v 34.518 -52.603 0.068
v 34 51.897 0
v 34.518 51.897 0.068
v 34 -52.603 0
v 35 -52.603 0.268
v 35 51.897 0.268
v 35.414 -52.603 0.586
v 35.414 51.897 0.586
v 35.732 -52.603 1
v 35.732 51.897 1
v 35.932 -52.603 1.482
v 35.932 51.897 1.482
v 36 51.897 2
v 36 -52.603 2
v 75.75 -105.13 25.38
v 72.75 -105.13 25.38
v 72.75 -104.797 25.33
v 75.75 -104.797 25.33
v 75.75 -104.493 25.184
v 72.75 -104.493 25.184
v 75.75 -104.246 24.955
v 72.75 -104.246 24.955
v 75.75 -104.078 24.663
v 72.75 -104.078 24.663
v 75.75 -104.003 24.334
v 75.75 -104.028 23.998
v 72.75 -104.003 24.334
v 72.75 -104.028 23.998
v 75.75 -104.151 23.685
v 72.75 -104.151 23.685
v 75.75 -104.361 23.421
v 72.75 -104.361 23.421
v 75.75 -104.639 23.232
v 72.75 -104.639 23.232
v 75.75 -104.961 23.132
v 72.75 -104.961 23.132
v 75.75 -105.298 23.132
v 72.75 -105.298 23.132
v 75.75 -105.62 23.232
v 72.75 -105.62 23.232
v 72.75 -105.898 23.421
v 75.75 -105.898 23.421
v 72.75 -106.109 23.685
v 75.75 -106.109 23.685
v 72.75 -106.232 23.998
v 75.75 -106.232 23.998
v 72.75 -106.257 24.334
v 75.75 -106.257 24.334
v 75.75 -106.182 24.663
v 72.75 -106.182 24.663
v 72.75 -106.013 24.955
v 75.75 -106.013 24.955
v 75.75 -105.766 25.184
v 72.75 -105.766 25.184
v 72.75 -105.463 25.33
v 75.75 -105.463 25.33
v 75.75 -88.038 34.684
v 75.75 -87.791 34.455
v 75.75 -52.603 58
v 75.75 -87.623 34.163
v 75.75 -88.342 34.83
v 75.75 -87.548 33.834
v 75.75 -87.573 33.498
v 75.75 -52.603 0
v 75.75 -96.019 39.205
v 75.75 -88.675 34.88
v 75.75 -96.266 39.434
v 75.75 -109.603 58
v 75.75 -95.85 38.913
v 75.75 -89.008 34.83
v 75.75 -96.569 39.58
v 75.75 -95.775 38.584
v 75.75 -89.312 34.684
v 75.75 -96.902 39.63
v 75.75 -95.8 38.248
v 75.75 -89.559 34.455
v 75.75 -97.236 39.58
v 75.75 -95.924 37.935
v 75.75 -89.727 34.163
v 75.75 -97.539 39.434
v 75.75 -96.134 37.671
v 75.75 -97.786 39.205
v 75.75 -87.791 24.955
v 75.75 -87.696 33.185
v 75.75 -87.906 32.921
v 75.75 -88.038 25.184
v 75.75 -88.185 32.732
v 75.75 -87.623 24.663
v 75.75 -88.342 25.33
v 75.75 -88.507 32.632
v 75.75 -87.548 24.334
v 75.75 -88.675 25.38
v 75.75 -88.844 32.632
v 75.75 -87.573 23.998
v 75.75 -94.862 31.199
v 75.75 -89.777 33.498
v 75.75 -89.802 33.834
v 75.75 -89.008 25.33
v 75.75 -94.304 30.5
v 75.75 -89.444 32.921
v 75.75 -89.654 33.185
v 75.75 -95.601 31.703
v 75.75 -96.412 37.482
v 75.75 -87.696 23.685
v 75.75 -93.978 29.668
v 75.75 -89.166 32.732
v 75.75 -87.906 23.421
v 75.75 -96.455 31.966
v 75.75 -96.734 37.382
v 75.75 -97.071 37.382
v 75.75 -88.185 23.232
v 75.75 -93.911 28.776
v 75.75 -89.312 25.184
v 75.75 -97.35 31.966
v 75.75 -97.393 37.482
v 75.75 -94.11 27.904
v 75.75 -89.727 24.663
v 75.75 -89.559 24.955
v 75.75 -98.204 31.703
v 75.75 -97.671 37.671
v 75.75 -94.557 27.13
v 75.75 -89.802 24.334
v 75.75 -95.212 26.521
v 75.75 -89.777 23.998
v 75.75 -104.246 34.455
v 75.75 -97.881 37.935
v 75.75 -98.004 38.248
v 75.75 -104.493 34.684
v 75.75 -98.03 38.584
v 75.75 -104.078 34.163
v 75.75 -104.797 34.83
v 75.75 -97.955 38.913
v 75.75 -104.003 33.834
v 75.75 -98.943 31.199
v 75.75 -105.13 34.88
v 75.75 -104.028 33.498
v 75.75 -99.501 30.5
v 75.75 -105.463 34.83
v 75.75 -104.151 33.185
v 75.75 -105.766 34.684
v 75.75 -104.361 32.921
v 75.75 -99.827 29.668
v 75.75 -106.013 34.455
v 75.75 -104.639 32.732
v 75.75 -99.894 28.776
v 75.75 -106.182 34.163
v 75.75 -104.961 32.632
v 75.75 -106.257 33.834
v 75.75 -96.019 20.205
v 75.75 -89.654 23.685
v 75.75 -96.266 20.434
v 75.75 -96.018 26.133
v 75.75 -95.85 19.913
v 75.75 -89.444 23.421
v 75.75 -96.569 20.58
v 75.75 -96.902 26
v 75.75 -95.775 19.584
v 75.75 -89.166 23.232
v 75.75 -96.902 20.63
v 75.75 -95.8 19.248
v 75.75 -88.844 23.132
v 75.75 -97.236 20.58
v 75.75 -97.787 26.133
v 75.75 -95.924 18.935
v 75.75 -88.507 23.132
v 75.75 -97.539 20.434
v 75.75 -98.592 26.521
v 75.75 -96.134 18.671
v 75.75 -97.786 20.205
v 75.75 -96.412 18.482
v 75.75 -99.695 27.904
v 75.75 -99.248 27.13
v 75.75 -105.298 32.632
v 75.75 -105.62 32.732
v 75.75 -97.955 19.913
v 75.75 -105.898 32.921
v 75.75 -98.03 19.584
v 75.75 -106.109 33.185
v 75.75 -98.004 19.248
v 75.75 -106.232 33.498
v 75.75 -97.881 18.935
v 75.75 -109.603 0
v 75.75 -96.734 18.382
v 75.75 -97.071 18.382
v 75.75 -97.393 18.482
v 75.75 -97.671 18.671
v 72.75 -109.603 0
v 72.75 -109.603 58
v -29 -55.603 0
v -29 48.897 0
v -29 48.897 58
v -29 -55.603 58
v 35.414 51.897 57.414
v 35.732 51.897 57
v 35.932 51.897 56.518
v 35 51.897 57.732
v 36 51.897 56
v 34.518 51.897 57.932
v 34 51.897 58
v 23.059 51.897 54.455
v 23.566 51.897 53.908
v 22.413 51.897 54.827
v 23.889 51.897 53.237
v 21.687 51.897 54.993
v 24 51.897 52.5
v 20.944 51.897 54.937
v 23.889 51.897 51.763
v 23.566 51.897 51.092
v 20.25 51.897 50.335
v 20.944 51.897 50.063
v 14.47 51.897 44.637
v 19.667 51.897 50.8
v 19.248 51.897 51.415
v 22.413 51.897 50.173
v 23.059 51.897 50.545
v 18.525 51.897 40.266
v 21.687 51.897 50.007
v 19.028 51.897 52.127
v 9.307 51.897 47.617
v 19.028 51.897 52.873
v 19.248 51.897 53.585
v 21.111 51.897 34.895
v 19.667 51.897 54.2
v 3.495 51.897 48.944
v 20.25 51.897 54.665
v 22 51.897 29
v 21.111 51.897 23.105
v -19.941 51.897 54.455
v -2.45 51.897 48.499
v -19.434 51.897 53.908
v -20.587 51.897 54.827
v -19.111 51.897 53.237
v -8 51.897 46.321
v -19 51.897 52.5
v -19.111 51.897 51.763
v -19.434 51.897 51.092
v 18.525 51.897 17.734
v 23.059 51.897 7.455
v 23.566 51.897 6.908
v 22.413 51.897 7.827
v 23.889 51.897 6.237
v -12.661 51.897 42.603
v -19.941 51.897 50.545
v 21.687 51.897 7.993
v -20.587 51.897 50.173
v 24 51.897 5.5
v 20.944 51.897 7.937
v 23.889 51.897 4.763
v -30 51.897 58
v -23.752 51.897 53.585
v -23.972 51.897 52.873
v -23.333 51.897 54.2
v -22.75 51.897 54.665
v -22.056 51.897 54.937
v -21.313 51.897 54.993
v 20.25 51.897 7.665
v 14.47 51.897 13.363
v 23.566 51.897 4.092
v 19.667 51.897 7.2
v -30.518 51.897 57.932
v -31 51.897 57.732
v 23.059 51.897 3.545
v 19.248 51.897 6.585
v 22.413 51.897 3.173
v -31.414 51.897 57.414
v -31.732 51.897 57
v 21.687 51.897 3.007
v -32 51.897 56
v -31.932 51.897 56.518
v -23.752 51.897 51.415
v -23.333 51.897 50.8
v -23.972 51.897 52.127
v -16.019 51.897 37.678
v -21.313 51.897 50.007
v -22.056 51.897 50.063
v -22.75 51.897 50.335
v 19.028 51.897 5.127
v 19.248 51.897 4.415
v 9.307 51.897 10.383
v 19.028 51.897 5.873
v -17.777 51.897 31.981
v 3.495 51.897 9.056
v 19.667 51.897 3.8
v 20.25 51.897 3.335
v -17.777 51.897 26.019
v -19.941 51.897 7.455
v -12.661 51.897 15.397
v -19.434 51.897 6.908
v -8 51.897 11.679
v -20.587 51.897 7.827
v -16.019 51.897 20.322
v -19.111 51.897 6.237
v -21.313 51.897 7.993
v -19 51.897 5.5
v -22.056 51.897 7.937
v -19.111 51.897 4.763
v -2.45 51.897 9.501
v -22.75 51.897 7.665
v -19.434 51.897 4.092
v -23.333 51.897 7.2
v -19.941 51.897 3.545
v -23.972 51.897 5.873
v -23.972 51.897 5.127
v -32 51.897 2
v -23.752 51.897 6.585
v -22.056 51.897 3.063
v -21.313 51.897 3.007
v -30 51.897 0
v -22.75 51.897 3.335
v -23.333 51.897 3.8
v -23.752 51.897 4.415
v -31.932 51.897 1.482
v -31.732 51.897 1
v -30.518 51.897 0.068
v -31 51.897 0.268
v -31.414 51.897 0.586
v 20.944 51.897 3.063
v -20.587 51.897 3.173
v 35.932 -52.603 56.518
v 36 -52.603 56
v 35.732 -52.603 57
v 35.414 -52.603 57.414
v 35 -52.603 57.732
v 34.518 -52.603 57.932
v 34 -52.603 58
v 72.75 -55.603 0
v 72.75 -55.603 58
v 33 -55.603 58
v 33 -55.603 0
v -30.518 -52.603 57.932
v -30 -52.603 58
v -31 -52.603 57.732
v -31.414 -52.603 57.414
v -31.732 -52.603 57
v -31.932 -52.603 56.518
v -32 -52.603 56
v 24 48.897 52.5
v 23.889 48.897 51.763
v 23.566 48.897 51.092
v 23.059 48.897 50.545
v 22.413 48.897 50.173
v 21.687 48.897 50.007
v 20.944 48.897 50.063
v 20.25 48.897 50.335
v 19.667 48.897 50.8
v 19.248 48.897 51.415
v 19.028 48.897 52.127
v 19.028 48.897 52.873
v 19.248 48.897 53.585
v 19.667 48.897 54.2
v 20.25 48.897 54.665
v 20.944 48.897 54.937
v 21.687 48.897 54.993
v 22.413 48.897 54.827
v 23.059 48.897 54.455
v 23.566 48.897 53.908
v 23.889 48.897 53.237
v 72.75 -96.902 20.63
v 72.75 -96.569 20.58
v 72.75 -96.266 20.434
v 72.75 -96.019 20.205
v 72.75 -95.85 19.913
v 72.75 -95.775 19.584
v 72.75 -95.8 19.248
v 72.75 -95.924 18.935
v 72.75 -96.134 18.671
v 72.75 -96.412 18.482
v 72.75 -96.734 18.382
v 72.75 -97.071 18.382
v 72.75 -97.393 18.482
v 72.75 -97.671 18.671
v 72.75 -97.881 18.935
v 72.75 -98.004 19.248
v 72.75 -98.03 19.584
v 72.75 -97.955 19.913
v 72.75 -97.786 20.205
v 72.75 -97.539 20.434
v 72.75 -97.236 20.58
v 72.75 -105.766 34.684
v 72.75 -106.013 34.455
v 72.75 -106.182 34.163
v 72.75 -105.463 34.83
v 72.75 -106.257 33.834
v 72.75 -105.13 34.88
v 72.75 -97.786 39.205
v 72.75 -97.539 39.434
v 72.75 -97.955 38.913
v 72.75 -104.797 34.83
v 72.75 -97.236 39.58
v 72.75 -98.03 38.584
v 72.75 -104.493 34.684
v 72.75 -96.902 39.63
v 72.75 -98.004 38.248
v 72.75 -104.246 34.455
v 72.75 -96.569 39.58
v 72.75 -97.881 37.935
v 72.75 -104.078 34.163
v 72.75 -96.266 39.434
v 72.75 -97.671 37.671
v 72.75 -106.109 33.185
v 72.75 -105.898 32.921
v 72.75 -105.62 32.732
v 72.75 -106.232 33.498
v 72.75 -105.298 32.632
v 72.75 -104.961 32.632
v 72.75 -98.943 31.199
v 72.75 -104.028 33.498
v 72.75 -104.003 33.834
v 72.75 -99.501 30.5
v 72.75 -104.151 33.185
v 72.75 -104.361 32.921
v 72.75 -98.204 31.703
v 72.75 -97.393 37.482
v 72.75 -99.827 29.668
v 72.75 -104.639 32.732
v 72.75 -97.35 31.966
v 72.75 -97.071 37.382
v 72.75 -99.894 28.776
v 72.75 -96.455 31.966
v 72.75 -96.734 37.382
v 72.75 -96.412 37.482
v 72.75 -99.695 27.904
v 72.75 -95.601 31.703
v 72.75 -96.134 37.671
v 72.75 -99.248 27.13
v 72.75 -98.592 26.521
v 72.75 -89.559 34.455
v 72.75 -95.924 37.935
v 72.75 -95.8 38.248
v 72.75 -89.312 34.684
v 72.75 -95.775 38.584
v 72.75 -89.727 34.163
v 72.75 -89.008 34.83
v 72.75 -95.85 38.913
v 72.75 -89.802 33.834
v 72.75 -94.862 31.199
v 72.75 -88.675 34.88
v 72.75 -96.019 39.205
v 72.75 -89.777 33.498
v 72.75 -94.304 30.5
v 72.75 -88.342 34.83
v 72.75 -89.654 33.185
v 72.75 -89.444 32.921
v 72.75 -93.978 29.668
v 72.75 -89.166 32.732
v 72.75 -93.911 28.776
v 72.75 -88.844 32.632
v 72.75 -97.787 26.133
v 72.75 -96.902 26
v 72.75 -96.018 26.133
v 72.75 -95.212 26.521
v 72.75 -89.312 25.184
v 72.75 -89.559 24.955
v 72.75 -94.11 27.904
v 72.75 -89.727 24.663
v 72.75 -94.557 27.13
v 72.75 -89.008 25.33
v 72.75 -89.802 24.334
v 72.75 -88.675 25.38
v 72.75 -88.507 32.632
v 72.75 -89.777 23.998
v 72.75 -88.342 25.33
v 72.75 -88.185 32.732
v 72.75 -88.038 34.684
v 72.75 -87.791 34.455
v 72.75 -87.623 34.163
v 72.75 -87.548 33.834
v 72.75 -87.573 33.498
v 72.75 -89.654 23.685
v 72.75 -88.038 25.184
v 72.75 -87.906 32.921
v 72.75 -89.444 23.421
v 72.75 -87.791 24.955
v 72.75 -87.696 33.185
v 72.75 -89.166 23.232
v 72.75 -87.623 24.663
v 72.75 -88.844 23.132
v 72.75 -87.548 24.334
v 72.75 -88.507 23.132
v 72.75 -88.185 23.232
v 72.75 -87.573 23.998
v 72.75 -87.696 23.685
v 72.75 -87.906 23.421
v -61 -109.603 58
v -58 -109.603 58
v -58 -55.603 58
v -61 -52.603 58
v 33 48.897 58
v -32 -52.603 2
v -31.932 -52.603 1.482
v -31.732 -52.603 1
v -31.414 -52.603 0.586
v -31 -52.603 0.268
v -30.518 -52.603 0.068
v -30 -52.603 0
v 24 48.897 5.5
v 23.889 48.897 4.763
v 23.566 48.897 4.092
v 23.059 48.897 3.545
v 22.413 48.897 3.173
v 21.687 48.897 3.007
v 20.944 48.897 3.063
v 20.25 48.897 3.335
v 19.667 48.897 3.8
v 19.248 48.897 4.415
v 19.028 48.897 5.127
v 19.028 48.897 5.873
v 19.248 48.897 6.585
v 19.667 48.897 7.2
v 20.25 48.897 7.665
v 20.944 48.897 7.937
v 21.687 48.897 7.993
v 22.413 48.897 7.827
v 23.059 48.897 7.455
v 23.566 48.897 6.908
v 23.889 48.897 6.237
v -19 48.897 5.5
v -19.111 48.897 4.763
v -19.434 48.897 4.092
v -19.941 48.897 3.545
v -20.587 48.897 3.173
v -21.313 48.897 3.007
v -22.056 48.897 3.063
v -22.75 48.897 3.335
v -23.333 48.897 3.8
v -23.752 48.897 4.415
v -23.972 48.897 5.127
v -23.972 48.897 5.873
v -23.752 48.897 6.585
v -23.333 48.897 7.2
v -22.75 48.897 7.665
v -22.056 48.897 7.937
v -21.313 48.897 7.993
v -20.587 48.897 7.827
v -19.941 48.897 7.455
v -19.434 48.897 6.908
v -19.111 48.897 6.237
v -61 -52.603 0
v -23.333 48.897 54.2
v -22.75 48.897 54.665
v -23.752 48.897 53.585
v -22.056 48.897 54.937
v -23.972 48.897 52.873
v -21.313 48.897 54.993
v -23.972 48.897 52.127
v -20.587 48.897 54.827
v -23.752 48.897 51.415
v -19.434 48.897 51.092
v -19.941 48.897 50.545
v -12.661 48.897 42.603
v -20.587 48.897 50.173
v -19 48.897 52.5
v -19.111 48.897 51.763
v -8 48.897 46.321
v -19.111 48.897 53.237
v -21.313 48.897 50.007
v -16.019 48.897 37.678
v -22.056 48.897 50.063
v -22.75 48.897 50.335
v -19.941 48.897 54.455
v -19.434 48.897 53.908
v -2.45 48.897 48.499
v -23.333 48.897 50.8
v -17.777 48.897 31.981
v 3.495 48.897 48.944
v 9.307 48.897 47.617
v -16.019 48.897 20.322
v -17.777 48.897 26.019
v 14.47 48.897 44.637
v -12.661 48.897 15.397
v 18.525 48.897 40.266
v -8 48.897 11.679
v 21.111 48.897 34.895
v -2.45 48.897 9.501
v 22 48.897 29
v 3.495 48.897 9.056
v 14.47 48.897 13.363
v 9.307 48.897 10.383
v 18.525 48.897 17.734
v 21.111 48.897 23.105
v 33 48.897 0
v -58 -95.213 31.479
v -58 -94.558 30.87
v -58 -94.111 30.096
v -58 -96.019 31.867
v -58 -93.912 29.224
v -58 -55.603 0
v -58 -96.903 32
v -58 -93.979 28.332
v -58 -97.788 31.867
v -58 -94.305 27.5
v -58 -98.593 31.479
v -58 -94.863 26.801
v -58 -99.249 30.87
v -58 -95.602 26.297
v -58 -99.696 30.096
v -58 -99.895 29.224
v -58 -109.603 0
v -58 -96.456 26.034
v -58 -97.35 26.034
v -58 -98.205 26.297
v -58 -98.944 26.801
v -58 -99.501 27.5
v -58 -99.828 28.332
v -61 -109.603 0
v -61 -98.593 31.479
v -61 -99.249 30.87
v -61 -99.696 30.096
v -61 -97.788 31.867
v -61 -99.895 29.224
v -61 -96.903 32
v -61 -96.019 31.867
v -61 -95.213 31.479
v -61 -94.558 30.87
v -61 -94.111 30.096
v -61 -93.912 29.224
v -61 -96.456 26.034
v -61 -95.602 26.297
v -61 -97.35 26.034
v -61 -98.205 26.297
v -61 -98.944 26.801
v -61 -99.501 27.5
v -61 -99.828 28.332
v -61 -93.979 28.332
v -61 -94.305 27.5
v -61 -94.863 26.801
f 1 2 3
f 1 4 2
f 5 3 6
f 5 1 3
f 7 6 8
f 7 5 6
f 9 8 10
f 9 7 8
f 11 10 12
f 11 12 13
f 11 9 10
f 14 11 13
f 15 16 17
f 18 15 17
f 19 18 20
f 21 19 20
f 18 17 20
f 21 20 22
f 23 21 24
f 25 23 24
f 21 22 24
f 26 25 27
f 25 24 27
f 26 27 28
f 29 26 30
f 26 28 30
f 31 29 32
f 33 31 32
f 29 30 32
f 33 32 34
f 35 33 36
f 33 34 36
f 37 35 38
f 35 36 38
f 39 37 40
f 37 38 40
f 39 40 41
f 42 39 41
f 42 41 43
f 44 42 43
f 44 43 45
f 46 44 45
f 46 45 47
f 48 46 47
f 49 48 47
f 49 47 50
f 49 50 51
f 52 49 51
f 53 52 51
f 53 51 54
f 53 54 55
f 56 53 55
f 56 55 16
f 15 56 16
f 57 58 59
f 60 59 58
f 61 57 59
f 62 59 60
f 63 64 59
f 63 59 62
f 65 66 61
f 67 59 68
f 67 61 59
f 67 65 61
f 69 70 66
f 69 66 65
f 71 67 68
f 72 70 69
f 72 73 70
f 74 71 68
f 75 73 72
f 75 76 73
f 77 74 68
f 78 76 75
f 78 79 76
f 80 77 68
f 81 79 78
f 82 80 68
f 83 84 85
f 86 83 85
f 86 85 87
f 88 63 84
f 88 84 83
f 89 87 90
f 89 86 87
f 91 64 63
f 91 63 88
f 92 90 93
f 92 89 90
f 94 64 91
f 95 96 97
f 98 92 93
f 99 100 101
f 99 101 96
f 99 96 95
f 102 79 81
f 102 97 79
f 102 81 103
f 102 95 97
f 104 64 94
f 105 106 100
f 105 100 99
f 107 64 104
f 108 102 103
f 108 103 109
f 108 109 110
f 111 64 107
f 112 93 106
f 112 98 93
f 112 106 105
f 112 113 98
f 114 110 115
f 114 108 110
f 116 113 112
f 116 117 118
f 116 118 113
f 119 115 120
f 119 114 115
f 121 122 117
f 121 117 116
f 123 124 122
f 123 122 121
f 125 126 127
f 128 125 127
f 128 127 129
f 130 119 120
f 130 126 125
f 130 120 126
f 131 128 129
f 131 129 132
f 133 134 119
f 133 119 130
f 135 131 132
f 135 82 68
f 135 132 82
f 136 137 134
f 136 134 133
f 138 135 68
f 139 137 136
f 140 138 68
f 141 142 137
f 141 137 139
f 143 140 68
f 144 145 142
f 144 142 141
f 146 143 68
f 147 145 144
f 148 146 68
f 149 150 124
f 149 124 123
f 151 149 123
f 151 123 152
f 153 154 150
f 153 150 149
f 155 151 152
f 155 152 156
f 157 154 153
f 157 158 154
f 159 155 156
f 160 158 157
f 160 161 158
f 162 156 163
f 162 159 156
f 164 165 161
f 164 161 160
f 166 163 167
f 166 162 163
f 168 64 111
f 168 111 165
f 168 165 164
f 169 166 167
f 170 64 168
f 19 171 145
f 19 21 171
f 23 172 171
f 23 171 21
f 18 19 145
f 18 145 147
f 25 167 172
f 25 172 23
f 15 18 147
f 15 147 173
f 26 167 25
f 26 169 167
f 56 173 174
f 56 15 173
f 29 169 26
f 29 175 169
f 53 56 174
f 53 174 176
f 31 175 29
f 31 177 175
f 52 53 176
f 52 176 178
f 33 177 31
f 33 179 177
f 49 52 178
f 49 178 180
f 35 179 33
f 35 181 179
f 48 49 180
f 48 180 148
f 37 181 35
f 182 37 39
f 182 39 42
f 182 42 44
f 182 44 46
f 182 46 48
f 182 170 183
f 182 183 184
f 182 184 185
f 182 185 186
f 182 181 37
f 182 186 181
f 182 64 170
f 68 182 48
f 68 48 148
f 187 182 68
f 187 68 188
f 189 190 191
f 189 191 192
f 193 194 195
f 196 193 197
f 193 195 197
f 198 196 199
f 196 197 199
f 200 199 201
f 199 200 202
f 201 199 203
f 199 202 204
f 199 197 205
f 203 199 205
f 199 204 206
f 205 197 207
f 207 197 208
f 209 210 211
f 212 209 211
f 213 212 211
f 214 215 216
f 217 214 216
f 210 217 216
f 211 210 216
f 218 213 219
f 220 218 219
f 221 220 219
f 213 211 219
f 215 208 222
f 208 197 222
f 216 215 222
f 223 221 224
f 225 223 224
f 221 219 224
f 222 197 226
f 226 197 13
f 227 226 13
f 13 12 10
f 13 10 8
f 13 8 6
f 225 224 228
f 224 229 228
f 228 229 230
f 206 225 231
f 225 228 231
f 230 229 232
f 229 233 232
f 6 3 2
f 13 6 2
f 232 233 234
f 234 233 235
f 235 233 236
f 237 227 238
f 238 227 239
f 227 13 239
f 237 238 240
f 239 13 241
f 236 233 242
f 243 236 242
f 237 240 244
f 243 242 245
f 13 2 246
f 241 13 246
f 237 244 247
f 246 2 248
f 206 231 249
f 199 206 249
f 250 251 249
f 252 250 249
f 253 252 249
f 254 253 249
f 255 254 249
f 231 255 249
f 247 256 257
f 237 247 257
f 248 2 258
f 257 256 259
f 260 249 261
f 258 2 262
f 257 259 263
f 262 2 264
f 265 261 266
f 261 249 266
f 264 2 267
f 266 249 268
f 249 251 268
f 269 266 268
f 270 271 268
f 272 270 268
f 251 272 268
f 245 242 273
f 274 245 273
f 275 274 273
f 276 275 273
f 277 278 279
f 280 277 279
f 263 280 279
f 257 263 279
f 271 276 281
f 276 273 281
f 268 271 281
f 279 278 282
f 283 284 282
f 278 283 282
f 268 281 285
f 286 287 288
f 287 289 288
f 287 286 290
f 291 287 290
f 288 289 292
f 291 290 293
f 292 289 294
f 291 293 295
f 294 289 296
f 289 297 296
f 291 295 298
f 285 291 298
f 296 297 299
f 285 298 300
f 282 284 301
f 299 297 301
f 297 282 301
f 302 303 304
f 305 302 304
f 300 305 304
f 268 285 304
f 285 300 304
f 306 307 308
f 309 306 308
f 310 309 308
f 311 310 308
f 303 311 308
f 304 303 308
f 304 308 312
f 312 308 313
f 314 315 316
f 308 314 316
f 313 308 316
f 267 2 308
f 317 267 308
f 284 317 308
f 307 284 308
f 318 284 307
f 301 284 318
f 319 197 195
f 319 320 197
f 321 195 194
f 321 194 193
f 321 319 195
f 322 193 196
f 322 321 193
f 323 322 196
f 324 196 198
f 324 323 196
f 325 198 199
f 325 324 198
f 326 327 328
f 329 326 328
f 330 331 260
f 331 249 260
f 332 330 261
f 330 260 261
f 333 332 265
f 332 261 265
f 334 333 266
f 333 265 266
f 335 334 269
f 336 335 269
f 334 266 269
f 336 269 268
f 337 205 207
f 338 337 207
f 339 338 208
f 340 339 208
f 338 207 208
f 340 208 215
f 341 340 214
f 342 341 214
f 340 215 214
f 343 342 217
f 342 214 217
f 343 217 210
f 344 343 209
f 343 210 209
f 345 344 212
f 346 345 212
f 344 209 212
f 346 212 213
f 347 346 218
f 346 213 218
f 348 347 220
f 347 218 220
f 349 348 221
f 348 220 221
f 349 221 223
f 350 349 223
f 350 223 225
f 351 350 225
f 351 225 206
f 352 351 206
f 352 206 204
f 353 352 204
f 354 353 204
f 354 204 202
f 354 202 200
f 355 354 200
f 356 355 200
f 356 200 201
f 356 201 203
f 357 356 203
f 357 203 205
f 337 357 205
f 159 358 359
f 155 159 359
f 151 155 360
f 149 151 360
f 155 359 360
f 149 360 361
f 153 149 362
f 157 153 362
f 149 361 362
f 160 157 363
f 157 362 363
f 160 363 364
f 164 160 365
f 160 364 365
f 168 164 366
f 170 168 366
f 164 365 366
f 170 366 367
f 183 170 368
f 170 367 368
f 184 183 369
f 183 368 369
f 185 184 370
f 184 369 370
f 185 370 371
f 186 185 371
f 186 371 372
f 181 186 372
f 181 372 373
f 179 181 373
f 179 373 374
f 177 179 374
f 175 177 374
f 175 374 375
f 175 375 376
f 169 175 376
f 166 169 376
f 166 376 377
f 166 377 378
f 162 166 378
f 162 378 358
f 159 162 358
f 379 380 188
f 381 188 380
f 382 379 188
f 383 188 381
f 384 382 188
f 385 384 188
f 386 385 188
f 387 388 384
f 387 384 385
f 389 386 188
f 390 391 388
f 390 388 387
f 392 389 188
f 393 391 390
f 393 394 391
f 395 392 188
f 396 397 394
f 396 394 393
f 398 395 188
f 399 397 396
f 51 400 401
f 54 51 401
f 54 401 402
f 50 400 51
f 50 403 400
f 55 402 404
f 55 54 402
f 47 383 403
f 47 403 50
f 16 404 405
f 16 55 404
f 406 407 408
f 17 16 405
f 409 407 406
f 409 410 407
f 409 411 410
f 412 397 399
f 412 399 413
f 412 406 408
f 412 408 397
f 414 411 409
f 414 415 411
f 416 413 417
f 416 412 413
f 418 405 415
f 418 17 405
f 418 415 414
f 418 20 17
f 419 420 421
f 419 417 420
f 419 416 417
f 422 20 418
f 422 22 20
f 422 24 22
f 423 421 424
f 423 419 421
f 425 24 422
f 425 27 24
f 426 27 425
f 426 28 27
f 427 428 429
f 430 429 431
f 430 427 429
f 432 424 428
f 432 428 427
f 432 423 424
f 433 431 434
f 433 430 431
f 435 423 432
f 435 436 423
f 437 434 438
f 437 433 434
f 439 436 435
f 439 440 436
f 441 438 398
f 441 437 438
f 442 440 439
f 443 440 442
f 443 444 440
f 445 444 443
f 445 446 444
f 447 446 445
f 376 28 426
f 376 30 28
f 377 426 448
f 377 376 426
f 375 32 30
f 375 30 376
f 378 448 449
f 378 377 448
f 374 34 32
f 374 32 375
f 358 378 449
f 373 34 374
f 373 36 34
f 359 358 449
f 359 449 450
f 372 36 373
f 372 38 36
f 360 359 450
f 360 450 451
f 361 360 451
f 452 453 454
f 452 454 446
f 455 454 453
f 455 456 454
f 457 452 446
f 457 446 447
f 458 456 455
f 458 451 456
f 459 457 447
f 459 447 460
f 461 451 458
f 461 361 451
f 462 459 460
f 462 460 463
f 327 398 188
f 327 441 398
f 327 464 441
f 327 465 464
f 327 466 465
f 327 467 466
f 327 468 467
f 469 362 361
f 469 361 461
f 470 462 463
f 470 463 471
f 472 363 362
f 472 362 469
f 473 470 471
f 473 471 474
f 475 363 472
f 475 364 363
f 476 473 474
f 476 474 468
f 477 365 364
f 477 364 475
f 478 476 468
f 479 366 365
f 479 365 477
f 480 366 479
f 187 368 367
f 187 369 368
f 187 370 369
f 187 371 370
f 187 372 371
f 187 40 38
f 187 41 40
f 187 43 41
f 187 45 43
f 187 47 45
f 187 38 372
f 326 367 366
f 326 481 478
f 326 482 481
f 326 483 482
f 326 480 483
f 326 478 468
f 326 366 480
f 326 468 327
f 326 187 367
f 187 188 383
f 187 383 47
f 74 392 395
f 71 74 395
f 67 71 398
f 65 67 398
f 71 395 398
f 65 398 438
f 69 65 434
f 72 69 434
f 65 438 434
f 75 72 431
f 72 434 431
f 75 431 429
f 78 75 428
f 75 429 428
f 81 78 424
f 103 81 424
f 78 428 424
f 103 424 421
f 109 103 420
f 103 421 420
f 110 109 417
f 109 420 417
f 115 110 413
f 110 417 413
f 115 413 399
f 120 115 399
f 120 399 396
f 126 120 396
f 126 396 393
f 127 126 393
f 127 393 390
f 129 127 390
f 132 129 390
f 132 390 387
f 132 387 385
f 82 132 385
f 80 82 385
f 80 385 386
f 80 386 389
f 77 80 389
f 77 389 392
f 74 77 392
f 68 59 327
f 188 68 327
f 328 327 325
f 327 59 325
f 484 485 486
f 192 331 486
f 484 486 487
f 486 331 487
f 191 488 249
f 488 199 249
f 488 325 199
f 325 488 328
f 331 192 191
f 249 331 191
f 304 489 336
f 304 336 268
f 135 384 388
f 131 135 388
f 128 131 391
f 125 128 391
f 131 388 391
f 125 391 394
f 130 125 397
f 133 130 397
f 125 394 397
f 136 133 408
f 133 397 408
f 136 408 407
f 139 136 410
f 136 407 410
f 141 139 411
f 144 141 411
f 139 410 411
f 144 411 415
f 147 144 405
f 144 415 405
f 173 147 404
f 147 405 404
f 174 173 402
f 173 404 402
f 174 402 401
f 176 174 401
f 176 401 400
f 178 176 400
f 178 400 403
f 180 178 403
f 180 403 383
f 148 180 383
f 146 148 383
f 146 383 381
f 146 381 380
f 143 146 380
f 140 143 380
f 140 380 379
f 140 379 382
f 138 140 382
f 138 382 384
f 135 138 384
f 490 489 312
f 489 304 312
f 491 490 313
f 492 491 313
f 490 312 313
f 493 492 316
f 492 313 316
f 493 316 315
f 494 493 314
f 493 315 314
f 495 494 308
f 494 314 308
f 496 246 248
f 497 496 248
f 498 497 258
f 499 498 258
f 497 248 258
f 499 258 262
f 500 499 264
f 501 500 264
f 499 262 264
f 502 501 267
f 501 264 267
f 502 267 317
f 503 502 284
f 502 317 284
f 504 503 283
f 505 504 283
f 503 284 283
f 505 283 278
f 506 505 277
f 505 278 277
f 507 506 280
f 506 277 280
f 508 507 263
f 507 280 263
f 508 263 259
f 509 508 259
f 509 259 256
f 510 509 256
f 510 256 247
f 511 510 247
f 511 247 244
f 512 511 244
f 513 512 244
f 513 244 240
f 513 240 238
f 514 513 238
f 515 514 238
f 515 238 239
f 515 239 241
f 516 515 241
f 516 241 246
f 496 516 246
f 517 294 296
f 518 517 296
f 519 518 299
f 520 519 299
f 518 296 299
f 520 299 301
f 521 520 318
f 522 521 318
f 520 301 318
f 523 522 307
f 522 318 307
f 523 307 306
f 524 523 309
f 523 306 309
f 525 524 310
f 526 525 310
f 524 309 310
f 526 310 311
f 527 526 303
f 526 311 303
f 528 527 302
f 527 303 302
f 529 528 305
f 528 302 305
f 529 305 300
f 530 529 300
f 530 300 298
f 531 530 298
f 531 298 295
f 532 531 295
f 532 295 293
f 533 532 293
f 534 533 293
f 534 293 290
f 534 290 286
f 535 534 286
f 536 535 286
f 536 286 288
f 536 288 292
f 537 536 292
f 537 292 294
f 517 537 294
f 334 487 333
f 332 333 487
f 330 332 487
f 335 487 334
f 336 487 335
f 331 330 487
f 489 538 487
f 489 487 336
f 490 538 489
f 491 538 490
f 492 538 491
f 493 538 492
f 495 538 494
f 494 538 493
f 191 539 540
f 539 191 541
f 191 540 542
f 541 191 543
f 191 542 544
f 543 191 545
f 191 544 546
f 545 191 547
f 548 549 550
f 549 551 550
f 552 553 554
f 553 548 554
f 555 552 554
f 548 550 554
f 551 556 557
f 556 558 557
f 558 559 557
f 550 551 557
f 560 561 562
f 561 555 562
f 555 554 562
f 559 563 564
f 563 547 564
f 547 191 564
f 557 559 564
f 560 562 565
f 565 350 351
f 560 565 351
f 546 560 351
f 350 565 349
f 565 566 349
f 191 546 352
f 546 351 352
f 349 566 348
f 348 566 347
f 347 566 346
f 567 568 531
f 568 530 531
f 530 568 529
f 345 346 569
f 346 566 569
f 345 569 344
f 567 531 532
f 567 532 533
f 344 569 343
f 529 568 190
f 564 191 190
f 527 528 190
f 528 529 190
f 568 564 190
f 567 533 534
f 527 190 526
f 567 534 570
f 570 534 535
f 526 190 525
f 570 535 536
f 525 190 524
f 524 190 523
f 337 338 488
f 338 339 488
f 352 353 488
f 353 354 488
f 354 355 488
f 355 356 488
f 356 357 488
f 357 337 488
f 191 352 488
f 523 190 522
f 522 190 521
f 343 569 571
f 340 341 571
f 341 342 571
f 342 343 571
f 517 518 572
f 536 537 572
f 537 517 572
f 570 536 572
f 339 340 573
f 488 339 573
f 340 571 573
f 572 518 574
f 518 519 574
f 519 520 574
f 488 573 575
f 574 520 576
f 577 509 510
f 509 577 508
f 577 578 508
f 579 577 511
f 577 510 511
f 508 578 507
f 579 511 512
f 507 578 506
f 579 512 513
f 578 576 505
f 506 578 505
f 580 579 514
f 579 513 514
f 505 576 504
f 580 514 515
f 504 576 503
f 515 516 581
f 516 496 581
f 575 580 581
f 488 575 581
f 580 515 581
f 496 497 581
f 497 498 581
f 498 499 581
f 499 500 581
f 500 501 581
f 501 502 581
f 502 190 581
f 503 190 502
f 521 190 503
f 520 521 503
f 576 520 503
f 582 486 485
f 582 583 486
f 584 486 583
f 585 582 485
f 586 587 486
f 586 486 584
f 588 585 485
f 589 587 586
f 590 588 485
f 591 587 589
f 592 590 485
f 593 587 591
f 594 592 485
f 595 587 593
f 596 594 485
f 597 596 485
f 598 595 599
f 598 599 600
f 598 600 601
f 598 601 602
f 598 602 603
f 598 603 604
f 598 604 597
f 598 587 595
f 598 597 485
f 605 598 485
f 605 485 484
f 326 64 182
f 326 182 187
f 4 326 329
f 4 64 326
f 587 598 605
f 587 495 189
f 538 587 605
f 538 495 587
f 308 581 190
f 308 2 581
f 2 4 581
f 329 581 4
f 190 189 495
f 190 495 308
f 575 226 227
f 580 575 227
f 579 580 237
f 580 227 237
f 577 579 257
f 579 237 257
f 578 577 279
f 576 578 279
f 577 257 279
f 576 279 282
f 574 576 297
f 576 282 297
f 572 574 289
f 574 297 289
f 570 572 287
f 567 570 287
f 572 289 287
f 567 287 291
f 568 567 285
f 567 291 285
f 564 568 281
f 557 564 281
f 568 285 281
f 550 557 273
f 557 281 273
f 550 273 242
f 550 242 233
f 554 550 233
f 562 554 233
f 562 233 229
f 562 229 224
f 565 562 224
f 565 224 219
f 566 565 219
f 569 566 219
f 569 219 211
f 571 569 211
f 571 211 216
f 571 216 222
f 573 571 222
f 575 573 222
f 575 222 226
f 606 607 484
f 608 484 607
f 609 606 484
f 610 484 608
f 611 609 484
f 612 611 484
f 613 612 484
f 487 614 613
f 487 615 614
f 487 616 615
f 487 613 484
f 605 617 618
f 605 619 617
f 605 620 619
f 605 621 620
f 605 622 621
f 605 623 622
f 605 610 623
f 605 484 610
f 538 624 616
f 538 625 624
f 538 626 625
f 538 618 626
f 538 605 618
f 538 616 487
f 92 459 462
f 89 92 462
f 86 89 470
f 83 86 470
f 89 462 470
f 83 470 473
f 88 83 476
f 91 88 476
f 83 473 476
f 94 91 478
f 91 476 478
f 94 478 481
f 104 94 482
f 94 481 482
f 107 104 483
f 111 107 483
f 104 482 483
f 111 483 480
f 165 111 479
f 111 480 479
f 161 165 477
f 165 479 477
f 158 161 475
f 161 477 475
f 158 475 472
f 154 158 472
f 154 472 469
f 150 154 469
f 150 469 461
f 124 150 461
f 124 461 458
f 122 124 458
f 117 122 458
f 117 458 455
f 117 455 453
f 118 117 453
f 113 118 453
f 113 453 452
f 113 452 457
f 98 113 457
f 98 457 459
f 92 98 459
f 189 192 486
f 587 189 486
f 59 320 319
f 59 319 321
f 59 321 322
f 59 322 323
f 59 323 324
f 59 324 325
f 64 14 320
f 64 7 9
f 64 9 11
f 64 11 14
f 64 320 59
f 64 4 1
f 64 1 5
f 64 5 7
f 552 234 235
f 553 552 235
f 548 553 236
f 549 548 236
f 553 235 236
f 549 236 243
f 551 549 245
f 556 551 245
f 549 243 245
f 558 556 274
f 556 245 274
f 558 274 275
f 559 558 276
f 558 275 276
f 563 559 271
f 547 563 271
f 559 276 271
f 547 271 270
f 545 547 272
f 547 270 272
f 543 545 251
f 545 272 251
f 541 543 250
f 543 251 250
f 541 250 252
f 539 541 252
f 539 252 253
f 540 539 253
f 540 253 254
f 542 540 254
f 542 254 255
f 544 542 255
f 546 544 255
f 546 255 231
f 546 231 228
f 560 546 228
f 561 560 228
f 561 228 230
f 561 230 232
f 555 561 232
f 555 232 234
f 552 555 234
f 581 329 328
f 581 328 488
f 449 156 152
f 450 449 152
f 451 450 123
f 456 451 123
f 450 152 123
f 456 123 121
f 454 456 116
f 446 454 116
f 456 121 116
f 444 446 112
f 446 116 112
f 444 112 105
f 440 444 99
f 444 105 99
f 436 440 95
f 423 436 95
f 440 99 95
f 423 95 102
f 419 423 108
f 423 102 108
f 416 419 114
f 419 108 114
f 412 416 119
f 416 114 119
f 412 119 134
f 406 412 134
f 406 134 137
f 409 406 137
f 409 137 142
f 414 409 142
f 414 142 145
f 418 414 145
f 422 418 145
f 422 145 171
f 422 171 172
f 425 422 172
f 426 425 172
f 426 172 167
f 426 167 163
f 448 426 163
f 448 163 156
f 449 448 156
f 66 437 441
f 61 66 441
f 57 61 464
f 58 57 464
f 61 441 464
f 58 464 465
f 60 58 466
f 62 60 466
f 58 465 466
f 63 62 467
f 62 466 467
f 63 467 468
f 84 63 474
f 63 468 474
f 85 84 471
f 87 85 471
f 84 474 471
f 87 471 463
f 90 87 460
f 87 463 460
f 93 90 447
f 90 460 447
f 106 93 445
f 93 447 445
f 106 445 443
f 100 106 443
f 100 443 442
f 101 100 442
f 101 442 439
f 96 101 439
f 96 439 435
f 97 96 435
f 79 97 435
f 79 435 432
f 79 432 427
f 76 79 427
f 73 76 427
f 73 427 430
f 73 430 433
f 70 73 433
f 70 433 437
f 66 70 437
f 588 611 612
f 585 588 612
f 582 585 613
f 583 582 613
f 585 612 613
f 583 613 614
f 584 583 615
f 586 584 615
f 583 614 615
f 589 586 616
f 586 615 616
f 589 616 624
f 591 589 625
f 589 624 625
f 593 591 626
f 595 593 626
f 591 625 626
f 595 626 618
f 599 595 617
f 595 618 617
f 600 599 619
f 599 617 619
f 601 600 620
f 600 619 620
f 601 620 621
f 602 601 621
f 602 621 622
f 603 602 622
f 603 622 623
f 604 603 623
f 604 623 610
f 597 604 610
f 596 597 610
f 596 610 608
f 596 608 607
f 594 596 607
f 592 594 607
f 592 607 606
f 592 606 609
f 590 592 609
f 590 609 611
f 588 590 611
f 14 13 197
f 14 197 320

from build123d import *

# Parameters (mm, degrees)
BOSS_EXTRUDE1_DEPTH       = 58
SKETCH3_R                 = 2.5
SKETCH3_R_2               = 20
CUT_EXTRUDE1_DEPTH        = 58
SKETCH5_R                 = 3
CUT_EXTRUDE3_DEPTH        = 58
F_4_40_TAPPED_HOLE2_D     = 2.2606
F_4_40_TAPPED_HOLE2_DEPTH = 7.6
F_4_40_TAPPED_HOLE2_TIP   = 0.679152758
SKETCH15_R                = 3
CUT_EXTRUDE4_DEPTH        = 10
FILLET1_R                 = 2
FILLET2_R                 = 2
FILLET3_R                 = 2
FILLET4_R                 = 2


with BuildPart() as part:
    # Sketch2 → Boss-Extrude1 (new body)
    with BuildSketch(Plane.XY):
        Polygon((2, 51.896715462), (36, 51.896715462), (36, -52.603284538), (75.75, -52.603284538), (75.75, -109.603284538), (72.75, -109.603284538), (72.75, -55.603284538), (33, -55.603284538), (33, 48.896715462), (2, 48.896715462), (-29, 48.896715462), (-29, -55.603284538), (-58, -55.603284538), (-58, -109.603284538), (-61, -109.603284538), (-61, -52.603284538), (-32, -52.603284538), (-32, 51.896715462), align=None)
    extrude(amount=BOSS_EXTRUDE1_DEPTH)

    # Sketch3 → Cut-Extrude1 (cut)
    with BuildSketch(Plane(origin=(0, 51.896715462, 0), x_dir=(1, 0, 0), z_dir=(0, 1, 0))):
        with Locations((-21.5, -5.5)):
            Circle(SKETCH3_R)
        with Locations((21.5, -5.5)):
            Circle(SKETCH3_R)
        with Locations((21.5, -52.5)):
            Circle(SKETCH3_R)
        with Locations((-21.5, -52.5)):
            Circle(SKETCH3_R)
        with Locations((2, -29)):
            Circle(SKETCH3_R_2)
    extrude(amount=-CUT_EXTRUDE1_DEPTH, mode=Mode.SUBTRACT)

    # Sketch5 → Cut-Extrude3 (cut)
    with BuildSketch(Plane.ZY.offset(61)):
        with Locations((29, -96.903284538)):
            Circle(SKETCH5_R)
    extrude(amount=-CUT_EXTRUDE3_DEPTH, mode=Mode.SUBTRACT)

    # #4-40 Tapped Hole2
    with Locations(Plane(origin=(75.75, 0, 0), x_dir=(0, 0, -1), z_dir=(1, 0, 0))):
        with Locations((-19.5, -96.902439923), (-24.25, -105.129681259), (-33.75, -105.129681259), (-38.5, -96.902439923), (-33.75, -88.675198587), (-24.25, -88.675198587)):
            Hole(F_4_40_TAPPED_HOLE2_D / 2, depth=F_4_40_TAPPED_HOLE2_DEPTH)
            with Locations((0, 0, -(F_4_40_TAPPED_HOLE2_DEPTH + F_4_40_TAPPED_HOLE2_TIP / 2))):  # 118° drill point
                Cone(0, F_4_40_TAPPED_HOLE2_D / 2, F_4_40_TAPPED_HOLE2_TIP, mode=Mode.SUBTRACT)

    # Sketch15 → Cut-Extrude4 (cut)
    with BuildSketch(Plane(origin=(75.75, 0, 0), x_dir=(0, 0, -1), z_dir=(1, 0, 0))):
        with Locations((-29, -96.902439923)):
            Circle(SKETCH15_R)
    extrude(amount=-CUT_EXTRUDE4_DEPTH, mode=Mode.SUBTRACT)

    # Fillet1
    fillet1_edges = [part.edges().sort_by_distance(p)[0] for p in [
        (36, -0.353284538, 58),
    ]]
    fillet(fillet1_edges, radius=FILLET1_R)

    # Fillet2
    fillet2_edges = [part.edges().sort_by_distance(p)[0] for p in [
        (36, -0.353284538, 0),
    ]]
    fillet(fillet2_edges, radius=FILLET2_R)

    # Fillet3
    fillet3_edges = [part.edges().sort_by_distance(p)[0] for p in [
        (-32, -0.353284538, 0),
    ]]
    fillet(fillet3_edges, radius=FILLET3_R)

    # Fillet4
    fillet4_edges = [part.edges().sort_by_distance(p)[0] for p in [
        (-32, -0.353284538, 58),
    ]]
    fillet(fillet4_edges, radius=FILLET4_R)


solid = part.part
